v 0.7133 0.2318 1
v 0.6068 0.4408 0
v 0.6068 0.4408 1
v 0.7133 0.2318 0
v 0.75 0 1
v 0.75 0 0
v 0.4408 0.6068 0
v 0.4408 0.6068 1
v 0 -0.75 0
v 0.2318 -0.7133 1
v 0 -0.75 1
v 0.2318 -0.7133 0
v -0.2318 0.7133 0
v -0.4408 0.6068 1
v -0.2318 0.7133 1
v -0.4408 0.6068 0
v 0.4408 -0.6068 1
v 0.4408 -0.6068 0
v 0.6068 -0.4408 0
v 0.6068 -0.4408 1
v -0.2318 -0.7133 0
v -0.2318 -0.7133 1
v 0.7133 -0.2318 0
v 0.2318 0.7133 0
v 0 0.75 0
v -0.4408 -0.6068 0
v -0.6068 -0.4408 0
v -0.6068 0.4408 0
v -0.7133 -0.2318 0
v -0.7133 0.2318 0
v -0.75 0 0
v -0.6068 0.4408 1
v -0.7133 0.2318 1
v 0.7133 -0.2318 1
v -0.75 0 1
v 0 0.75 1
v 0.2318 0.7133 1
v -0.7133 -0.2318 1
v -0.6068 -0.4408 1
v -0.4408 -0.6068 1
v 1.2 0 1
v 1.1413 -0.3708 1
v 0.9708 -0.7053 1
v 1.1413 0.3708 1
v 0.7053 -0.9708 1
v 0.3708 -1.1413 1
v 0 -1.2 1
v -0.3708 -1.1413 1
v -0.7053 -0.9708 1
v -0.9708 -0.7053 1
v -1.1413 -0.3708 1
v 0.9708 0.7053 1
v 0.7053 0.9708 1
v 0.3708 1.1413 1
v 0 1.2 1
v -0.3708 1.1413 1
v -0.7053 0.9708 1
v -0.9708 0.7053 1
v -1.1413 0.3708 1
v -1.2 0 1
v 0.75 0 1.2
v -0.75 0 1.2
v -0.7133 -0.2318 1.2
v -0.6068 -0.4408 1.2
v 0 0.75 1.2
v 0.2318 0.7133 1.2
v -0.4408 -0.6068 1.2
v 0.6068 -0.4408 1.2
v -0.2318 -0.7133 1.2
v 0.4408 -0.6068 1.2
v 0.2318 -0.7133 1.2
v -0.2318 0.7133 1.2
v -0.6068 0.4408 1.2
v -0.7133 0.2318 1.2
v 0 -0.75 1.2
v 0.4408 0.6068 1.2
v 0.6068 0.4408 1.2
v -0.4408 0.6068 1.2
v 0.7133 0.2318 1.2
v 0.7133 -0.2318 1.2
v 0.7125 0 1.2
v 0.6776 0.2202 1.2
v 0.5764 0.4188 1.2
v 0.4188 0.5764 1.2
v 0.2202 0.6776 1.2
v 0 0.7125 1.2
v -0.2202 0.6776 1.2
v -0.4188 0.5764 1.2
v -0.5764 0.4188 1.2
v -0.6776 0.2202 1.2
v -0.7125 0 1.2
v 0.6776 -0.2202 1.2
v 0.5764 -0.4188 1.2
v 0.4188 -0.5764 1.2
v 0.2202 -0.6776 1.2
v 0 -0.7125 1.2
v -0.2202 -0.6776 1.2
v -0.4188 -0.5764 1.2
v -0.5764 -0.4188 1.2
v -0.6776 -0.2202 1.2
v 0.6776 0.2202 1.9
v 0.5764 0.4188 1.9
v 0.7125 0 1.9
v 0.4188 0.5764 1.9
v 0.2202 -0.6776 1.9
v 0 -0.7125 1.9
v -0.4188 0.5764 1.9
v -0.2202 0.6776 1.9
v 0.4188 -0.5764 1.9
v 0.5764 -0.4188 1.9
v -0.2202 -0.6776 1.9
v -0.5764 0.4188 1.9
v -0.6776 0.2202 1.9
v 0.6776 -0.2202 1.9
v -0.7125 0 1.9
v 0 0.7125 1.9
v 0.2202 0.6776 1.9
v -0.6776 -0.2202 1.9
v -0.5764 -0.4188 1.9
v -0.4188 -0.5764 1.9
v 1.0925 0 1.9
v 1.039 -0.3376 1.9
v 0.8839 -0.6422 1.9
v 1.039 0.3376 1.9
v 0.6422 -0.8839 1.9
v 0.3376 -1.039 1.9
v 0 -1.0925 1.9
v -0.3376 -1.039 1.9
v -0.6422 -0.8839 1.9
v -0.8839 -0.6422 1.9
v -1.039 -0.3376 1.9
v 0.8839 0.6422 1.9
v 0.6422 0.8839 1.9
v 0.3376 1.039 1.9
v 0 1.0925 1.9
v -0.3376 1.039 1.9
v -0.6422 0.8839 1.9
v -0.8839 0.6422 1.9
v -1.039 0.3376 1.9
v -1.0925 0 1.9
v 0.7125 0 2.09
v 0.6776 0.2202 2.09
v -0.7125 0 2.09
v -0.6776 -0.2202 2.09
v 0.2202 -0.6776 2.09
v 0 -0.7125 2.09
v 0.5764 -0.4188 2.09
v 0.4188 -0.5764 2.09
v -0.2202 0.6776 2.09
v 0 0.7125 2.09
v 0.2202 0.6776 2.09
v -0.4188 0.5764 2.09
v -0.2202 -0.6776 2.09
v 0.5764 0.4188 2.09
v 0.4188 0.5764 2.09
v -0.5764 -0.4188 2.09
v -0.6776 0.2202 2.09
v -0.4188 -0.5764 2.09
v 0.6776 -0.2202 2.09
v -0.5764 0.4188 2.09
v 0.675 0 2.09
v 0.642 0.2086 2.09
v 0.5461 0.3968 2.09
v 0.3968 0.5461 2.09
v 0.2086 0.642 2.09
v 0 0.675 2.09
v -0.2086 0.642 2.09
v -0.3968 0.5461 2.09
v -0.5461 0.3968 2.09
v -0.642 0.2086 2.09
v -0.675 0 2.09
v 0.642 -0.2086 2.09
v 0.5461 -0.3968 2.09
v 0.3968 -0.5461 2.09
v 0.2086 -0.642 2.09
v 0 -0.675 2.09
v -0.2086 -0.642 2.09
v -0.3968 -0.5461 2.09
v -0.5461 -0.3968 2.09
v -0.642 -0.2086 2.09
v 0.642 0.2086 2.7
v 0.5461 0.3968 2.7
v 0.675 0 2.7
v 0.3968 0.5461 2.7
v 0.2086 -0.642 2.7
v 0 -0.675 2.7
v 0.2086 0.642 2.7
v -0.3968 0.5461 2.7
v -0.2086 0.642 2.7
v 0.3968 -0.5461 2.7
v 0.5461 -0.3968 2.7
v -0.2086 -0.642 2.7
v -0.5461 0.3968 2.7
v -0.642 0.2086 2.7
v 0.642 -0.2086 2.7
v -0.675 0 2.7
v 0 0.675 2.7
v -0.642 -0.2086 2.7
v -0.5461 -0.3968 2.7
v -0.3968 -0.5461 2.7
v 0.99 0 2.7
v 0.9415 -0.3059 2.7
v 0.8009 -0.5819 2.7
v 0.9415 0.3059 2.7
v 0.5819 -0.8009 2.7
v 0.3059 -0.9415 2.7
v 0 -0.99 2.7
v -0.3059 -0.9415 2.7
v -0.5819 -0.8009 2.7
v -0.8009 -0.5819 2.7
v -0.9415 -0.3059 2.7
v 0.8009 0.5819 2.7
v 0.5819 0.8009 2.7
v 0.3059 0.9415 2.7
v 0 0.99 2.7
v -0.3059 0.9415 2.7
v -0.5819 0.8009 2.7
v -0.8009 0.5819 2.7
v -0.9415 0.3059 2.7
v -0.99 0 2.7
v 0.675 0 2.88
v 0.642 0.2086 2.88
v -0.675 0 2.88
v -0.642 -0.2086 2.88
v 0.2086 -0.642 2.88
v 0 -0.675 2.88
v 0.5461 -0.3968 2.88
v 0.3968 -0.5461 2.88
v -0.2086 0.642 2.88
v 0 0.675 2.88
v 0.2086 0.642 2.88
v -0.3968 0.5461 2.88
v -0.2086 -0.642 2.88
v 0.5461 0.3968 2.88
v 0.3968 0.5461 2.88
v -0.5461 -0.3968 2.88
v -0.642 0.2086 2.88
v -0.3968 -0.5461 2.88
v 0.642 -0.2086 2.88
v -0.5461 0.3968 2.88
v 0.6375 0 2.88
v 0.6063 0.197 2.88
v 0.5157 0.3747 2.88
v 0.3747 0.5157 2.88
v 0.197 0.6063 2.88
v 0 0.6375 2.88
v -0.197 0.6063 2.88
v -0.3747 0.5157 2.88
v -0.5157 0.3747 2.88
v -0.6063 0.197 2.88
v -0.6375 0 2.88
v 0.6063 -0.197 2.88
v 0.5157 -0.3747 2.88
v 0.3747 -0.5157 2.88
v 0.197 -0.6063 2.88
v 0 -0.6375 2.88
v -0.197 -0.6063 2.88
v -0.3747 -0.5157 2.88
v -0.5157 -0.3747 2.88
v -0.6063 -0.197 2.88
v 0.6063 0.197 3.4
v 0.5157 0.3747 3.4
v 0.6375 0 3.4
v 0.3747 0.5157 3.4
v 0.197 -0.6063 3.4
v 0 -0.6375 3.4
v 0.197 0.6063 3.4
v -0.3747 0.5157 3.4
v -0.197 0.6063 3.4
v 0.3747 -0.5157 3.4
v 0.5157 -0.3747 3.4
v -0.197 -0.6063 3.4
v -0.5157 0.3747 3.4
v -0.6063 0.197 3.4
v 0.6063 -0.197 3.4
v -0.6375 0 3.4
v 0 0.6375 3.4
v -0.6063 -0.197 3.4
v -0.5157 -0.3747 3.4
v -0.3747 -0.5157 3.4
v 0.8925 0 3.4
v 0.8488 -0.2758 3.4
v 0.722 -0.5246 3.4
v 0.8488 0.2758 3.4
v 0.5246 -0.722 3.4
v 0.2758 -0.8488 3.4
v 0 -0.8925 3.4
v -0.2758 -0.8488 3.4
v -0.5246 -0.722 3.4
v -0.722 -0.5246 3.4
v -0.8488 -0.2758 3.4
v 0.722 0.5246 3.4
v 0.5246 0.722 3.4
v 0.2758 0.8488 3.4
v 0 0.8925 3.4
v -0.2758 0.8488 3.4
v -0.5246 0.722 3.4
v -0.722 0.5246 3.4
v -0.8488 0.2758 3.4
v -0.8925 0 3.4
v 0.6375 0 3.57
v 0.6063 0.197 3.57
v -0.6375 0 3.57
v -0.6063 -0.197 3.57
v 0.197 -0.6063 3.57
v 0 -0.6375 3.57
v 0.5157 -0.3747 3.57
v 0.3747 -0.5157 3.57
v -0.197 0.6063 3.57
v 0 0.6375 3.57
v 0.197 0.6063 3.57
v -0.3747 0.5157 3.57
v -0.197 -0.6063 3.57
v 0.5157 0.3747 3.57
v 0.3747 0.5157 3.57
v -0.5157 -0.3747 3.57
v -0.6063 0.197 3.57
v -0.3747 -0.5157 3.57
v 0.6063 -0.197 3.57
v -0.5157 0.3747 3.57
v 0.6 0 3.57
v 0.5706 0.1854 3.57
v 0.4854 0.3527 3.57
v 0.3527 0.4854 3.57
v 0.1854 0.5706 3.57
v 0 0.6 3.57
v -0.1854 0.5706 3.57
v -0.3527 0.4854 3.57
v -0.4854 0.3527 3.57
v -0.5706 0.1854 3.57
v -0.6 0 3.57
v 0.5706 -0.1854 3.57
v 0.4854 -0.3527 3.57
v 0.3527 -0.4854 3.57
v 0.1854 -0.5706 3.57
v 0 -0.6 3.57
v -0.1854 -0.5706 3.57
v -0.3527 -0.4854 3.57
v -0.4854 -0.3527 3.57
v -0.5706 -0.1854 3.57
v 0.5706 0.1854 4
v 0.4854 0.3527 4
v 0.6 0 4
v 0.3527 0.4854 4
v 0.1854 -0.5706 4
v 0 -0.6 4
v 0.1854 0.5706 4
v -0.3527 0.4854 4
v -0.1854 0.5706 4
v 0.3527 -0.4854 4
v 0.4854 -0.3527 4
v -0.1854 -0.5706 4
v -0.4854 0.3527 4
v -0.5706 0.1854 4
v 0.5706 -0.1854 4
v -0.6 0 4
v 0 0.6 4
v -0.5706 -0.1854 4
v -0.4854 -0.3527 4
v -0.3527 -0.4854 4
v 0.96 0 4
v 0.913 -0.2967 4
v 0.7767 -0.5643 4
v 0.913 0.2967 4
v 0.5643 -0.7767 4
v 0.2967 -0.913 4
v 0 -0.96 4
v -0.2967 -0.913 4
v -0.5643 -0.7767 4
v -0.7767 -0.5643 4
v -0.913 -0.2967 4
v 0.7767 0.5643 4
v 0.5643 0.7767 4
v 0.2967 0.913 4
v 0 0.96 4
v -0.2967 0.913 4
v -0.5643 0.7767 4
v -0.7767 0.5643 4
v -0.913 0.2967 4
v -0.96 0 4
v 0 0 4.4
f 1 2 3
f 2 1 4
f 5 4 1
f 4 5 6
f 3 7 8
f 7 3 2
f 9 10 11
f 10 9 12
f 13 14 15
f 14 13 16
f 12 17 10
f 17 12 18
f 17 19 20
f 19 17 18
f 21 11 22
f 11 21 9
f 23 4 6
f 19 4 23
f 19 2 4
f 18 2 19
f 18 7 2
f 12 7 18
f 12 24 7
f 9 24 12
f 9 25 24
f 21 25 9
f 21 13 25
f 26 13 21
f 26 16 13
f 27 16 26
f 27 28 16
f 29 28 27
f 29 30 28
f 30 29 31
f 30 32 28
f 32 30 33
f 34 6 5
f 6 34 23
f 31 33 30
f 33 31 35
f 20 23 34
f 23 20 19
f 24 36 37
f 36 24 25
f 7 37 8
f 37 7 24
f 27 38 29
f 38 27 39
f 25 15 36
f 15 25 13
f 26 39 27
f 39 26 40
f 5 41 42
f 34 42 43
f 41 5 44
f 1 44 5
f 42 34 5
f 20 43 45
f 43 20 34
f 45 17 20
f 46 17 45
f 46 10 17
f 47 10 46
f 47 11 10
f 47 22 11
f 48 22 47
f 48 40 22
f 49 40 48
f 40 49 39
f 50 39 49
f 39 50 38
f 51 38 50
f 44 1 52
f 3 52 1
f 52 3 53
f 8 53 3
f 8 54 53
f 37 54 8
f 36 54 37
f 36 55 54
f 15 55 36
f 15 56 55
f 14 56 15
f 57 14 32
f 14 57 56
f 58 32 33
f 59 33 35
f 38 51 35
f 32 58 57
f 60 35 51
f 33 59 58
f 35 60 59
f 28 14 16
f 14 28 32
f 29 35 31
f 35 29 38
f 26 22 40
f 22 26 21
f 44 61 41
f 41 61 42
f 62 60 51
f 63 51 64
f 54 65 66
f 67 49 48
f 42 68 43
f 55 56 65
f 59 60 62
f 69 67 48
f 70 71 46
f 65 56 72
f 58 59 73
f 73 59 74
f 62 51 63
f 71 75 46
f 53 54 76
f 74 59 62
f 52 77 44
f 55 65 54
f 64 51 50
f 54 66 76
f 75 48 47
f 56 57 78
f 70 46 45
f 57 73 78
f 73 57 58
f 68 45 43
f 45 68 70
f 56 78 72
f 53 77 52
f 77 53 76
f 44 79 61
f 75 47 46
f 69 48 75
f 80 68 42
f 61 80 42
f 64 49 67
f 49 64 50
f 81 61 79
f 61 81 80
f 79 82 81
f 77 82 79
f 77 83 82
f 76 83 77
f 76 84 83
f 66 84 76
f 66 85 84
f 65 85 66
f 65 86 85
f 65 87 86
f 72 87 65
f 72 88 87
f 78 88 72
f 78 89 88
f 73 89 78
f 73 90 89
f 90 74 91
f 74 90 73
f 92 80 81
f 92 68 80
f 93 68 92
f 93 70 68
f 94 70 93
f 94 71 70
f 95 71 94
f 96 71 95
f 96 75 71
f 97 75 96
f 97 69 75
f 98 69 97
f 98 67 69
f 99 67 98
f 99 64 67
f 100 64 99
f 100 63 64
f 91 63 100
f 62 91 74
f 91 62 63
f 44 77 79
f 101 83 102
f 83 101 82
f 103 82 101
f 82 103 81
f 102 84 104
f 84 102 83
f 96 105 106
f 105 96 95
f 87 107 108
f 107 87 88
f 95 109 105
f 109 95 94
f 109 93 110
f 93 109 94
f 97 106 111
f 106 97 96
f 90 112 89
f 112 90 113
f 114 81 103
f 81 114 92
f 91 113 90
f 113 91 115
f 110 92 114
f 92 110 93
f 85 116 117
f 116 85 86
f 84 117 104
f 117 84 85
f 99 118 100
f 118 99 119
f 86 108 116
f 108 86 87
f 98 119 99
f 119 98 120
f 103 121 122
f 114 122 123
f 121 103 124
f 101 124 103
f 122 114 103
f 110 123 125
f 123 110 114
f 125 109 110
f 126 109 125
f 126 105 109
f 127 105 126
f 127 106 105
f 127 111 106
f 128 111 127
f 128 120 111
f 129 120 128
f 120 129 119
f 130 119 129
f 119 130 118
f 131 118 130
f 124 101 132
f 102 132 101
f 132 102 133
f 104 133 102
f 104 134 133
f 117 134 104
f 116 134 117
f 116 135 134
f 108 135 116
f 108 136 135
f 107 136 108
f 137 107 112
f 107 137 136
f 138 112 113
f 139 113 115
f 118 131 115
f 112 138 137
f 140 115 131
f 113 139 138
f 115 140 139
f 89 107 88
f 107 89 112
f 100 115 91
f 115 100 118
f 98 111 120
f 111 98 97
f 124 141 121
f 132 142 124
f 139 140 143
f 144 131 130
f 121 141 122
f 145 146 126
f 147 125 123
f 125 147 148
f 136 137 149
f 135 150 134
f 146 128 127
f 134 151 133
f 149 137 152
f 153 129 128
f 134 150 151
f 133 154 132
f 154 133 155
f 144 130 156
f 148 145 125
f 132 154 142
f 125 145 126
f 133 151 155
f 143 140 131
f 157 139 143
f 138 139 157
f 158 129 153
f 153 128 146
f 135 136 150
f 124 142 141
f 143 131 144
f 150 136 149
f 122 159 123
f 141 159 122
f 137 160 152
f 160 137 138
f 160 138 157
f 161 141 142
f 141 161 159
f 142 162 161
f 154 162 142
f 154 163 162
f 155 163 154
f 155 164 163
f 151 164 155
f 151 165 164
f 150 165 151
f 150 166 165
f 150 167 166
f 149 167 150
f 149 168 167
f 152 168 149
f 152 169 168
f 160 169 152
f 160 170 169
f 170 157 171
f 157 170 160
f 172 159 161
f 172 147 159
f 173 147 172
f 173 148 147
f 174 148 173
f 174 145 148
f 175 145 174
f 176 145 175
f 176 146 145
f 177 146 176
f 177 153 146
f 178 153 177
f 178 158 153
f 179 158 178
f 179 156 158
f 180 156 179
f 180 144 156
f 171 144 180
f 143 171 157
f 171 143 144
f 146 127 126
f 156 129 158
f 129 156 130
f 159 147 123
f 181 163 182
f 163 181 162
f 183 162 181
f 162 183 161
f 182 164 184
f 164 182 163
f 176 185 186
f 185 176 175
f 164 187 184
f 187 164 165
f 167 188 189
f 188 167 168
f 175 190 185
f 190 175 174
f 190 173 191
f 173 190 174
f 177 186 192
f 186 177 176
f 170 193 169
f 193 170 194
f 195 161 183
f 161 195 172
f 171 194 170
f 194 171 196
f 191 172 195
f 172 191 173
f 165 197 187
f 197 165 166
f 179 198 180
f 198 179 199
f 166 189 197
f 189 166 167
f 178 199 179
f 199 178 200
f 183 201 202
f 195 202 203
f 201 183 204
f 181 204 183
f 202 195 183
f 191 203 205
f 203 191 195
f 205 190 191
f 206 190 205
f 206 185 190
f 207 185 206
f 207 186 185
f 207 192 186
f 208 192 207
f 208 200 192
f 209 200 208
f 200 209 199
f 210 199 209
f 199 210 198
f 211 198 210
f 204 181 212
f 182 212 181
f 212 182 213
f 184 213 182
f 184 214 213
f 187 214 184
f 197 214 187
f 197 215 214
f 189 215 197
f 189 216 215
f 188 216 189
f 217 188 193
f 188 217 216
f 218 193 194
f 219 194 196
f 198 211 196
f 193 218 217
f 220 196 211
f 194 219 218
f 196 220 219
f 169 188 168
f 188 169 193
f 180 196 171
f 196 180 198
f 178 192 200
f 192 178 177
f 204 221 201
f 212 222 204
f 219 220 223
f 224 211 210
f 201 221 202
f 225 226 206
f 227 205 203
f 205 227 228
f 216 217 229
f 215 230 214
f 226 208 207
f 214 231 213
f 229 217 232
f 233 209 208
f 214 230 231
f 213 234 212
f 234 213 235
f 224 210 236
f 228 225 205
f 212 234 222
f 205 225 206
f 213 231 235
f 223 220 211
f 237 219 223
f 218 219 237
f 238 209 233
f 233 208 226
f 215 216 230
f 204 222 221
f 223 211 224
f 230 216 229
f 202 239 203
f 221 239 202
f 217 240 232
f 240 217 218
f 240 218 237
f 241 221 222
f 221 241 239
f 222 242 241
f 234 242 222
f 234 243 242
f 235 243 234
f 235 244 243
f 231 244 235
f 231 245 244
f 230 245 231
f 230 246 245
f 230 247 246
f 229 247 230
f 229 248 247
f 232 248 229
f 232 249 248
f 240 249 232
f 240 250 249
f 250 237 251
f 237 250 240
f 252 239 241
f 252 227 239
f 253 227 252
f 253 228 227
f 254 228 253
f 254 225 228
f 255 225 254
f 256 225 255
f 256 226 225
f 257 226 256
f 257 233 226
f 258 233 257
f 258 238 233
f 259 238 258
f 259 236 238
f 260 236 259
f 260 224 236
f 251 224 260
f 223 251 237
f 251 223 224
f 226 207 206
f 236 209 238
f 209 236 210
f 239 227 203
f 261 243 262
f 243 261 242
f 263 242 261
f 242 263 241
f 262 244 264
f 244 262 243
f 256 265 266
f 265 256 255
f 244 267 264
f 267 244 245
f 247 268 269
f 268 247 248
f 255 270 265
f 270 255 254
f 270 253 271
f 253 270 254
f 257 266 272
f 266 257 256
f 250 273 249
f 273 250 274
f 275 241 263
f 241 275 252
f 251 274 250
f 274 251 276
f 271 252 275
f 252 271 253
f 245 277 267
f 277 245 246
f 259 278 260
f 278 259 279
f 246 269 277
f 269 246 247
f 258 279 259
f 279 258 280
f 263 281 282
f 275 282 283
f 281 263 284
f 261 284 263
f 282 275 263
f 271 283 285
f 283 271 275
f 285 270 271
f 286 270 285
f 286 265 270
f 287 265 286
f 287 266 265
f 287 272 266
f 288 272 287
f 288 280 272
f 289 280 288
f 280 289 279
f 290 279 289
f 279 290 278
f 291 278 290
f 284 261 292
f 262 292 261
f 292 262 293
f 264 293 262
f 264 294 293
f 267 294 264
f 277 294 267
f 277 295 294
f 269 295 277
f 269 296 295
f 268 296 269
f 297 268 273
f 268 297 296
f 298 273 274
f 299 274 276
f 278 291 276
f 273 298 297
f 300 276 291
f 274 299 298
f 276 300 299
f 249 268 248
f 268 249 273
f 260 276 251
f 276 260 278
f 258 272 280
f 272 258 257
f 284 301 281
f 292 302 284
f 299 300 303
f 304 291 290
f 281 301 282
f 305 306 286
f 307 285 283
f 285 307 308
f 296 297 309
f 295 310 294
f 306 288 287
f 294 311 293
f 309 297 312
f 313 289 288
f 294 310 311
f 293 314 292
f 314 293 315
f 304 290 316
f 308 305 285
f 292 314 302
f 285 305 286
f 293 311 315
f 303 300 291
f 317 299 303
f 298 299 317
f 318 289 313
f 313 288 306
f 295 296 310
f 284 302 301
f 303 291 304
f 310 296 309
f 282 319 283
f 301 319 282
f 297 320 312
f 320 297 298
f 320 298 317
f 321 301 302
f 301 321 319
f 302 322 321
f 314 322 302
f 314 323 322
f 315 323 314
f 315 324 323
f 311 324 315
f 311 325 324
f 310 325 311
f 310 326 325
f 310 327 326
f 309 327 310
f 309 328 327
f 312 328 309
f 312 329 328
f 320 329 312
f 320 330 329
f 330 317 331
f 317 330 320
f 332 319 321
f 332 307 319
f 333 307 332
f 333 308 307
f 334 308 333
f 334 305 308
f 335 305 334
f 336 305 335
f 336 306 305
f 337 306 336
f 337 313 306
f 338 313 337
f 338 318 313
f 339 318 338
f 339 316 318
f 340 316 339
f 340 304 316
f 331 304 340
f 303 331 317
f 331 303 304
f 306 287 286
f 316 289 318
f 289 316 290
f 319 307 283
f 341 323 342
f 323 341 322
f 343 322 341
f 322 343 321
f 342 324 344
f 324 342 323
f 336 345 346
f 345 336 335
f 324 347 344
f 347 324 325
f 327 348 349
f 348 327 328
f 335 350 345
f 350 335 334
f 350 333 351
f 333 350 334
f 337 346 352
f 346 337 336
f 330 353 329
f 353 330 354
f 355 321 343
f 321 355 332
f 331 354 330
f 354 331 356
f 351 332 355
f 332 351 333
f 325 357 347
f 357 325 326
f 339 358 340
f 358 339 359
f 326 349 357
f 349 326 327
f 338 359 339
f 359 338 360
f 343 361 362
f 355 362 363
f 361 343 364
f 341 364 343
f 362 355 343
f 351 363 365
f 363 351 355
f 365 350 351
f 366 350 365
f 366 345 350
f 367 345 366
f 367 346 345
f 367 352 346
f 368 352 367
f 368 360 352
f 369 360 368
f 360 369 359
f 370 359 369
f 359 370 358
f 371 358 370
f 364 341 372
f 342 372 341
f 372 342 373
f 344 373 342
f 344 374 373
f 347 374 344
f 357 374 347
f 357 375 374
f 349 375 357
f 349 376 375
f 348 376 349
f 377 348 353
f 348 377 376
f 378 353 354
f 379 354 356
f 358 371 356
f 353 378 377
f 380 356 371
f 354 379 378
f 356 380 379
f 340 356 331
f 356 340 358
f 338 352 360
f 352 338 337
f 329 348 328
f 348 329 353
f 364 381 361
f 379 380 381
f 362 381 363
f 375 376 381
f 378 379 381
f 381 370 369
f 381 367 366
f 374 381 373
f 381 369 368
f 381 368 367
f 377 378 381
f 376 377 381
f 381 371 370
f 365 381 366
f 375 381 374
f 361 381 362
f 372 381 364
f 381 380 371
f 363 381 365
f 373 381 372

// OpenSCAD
$fn=20;

for(i = [0:4]) {
  scale(1 - i * 0.05) {
    translate([0, 0, 1 * i])
      cylinder(1, 0.75, 0.75);
    
    translate([0, 0, 1 * i + 1])
      if (i == 4) {
        cylinder(0.5, 1.6  - i * 0.1, 0);
      } else {
        cylinder(0.2, 1.2 - i * 0.05, 0.75);
      }
  }
}
